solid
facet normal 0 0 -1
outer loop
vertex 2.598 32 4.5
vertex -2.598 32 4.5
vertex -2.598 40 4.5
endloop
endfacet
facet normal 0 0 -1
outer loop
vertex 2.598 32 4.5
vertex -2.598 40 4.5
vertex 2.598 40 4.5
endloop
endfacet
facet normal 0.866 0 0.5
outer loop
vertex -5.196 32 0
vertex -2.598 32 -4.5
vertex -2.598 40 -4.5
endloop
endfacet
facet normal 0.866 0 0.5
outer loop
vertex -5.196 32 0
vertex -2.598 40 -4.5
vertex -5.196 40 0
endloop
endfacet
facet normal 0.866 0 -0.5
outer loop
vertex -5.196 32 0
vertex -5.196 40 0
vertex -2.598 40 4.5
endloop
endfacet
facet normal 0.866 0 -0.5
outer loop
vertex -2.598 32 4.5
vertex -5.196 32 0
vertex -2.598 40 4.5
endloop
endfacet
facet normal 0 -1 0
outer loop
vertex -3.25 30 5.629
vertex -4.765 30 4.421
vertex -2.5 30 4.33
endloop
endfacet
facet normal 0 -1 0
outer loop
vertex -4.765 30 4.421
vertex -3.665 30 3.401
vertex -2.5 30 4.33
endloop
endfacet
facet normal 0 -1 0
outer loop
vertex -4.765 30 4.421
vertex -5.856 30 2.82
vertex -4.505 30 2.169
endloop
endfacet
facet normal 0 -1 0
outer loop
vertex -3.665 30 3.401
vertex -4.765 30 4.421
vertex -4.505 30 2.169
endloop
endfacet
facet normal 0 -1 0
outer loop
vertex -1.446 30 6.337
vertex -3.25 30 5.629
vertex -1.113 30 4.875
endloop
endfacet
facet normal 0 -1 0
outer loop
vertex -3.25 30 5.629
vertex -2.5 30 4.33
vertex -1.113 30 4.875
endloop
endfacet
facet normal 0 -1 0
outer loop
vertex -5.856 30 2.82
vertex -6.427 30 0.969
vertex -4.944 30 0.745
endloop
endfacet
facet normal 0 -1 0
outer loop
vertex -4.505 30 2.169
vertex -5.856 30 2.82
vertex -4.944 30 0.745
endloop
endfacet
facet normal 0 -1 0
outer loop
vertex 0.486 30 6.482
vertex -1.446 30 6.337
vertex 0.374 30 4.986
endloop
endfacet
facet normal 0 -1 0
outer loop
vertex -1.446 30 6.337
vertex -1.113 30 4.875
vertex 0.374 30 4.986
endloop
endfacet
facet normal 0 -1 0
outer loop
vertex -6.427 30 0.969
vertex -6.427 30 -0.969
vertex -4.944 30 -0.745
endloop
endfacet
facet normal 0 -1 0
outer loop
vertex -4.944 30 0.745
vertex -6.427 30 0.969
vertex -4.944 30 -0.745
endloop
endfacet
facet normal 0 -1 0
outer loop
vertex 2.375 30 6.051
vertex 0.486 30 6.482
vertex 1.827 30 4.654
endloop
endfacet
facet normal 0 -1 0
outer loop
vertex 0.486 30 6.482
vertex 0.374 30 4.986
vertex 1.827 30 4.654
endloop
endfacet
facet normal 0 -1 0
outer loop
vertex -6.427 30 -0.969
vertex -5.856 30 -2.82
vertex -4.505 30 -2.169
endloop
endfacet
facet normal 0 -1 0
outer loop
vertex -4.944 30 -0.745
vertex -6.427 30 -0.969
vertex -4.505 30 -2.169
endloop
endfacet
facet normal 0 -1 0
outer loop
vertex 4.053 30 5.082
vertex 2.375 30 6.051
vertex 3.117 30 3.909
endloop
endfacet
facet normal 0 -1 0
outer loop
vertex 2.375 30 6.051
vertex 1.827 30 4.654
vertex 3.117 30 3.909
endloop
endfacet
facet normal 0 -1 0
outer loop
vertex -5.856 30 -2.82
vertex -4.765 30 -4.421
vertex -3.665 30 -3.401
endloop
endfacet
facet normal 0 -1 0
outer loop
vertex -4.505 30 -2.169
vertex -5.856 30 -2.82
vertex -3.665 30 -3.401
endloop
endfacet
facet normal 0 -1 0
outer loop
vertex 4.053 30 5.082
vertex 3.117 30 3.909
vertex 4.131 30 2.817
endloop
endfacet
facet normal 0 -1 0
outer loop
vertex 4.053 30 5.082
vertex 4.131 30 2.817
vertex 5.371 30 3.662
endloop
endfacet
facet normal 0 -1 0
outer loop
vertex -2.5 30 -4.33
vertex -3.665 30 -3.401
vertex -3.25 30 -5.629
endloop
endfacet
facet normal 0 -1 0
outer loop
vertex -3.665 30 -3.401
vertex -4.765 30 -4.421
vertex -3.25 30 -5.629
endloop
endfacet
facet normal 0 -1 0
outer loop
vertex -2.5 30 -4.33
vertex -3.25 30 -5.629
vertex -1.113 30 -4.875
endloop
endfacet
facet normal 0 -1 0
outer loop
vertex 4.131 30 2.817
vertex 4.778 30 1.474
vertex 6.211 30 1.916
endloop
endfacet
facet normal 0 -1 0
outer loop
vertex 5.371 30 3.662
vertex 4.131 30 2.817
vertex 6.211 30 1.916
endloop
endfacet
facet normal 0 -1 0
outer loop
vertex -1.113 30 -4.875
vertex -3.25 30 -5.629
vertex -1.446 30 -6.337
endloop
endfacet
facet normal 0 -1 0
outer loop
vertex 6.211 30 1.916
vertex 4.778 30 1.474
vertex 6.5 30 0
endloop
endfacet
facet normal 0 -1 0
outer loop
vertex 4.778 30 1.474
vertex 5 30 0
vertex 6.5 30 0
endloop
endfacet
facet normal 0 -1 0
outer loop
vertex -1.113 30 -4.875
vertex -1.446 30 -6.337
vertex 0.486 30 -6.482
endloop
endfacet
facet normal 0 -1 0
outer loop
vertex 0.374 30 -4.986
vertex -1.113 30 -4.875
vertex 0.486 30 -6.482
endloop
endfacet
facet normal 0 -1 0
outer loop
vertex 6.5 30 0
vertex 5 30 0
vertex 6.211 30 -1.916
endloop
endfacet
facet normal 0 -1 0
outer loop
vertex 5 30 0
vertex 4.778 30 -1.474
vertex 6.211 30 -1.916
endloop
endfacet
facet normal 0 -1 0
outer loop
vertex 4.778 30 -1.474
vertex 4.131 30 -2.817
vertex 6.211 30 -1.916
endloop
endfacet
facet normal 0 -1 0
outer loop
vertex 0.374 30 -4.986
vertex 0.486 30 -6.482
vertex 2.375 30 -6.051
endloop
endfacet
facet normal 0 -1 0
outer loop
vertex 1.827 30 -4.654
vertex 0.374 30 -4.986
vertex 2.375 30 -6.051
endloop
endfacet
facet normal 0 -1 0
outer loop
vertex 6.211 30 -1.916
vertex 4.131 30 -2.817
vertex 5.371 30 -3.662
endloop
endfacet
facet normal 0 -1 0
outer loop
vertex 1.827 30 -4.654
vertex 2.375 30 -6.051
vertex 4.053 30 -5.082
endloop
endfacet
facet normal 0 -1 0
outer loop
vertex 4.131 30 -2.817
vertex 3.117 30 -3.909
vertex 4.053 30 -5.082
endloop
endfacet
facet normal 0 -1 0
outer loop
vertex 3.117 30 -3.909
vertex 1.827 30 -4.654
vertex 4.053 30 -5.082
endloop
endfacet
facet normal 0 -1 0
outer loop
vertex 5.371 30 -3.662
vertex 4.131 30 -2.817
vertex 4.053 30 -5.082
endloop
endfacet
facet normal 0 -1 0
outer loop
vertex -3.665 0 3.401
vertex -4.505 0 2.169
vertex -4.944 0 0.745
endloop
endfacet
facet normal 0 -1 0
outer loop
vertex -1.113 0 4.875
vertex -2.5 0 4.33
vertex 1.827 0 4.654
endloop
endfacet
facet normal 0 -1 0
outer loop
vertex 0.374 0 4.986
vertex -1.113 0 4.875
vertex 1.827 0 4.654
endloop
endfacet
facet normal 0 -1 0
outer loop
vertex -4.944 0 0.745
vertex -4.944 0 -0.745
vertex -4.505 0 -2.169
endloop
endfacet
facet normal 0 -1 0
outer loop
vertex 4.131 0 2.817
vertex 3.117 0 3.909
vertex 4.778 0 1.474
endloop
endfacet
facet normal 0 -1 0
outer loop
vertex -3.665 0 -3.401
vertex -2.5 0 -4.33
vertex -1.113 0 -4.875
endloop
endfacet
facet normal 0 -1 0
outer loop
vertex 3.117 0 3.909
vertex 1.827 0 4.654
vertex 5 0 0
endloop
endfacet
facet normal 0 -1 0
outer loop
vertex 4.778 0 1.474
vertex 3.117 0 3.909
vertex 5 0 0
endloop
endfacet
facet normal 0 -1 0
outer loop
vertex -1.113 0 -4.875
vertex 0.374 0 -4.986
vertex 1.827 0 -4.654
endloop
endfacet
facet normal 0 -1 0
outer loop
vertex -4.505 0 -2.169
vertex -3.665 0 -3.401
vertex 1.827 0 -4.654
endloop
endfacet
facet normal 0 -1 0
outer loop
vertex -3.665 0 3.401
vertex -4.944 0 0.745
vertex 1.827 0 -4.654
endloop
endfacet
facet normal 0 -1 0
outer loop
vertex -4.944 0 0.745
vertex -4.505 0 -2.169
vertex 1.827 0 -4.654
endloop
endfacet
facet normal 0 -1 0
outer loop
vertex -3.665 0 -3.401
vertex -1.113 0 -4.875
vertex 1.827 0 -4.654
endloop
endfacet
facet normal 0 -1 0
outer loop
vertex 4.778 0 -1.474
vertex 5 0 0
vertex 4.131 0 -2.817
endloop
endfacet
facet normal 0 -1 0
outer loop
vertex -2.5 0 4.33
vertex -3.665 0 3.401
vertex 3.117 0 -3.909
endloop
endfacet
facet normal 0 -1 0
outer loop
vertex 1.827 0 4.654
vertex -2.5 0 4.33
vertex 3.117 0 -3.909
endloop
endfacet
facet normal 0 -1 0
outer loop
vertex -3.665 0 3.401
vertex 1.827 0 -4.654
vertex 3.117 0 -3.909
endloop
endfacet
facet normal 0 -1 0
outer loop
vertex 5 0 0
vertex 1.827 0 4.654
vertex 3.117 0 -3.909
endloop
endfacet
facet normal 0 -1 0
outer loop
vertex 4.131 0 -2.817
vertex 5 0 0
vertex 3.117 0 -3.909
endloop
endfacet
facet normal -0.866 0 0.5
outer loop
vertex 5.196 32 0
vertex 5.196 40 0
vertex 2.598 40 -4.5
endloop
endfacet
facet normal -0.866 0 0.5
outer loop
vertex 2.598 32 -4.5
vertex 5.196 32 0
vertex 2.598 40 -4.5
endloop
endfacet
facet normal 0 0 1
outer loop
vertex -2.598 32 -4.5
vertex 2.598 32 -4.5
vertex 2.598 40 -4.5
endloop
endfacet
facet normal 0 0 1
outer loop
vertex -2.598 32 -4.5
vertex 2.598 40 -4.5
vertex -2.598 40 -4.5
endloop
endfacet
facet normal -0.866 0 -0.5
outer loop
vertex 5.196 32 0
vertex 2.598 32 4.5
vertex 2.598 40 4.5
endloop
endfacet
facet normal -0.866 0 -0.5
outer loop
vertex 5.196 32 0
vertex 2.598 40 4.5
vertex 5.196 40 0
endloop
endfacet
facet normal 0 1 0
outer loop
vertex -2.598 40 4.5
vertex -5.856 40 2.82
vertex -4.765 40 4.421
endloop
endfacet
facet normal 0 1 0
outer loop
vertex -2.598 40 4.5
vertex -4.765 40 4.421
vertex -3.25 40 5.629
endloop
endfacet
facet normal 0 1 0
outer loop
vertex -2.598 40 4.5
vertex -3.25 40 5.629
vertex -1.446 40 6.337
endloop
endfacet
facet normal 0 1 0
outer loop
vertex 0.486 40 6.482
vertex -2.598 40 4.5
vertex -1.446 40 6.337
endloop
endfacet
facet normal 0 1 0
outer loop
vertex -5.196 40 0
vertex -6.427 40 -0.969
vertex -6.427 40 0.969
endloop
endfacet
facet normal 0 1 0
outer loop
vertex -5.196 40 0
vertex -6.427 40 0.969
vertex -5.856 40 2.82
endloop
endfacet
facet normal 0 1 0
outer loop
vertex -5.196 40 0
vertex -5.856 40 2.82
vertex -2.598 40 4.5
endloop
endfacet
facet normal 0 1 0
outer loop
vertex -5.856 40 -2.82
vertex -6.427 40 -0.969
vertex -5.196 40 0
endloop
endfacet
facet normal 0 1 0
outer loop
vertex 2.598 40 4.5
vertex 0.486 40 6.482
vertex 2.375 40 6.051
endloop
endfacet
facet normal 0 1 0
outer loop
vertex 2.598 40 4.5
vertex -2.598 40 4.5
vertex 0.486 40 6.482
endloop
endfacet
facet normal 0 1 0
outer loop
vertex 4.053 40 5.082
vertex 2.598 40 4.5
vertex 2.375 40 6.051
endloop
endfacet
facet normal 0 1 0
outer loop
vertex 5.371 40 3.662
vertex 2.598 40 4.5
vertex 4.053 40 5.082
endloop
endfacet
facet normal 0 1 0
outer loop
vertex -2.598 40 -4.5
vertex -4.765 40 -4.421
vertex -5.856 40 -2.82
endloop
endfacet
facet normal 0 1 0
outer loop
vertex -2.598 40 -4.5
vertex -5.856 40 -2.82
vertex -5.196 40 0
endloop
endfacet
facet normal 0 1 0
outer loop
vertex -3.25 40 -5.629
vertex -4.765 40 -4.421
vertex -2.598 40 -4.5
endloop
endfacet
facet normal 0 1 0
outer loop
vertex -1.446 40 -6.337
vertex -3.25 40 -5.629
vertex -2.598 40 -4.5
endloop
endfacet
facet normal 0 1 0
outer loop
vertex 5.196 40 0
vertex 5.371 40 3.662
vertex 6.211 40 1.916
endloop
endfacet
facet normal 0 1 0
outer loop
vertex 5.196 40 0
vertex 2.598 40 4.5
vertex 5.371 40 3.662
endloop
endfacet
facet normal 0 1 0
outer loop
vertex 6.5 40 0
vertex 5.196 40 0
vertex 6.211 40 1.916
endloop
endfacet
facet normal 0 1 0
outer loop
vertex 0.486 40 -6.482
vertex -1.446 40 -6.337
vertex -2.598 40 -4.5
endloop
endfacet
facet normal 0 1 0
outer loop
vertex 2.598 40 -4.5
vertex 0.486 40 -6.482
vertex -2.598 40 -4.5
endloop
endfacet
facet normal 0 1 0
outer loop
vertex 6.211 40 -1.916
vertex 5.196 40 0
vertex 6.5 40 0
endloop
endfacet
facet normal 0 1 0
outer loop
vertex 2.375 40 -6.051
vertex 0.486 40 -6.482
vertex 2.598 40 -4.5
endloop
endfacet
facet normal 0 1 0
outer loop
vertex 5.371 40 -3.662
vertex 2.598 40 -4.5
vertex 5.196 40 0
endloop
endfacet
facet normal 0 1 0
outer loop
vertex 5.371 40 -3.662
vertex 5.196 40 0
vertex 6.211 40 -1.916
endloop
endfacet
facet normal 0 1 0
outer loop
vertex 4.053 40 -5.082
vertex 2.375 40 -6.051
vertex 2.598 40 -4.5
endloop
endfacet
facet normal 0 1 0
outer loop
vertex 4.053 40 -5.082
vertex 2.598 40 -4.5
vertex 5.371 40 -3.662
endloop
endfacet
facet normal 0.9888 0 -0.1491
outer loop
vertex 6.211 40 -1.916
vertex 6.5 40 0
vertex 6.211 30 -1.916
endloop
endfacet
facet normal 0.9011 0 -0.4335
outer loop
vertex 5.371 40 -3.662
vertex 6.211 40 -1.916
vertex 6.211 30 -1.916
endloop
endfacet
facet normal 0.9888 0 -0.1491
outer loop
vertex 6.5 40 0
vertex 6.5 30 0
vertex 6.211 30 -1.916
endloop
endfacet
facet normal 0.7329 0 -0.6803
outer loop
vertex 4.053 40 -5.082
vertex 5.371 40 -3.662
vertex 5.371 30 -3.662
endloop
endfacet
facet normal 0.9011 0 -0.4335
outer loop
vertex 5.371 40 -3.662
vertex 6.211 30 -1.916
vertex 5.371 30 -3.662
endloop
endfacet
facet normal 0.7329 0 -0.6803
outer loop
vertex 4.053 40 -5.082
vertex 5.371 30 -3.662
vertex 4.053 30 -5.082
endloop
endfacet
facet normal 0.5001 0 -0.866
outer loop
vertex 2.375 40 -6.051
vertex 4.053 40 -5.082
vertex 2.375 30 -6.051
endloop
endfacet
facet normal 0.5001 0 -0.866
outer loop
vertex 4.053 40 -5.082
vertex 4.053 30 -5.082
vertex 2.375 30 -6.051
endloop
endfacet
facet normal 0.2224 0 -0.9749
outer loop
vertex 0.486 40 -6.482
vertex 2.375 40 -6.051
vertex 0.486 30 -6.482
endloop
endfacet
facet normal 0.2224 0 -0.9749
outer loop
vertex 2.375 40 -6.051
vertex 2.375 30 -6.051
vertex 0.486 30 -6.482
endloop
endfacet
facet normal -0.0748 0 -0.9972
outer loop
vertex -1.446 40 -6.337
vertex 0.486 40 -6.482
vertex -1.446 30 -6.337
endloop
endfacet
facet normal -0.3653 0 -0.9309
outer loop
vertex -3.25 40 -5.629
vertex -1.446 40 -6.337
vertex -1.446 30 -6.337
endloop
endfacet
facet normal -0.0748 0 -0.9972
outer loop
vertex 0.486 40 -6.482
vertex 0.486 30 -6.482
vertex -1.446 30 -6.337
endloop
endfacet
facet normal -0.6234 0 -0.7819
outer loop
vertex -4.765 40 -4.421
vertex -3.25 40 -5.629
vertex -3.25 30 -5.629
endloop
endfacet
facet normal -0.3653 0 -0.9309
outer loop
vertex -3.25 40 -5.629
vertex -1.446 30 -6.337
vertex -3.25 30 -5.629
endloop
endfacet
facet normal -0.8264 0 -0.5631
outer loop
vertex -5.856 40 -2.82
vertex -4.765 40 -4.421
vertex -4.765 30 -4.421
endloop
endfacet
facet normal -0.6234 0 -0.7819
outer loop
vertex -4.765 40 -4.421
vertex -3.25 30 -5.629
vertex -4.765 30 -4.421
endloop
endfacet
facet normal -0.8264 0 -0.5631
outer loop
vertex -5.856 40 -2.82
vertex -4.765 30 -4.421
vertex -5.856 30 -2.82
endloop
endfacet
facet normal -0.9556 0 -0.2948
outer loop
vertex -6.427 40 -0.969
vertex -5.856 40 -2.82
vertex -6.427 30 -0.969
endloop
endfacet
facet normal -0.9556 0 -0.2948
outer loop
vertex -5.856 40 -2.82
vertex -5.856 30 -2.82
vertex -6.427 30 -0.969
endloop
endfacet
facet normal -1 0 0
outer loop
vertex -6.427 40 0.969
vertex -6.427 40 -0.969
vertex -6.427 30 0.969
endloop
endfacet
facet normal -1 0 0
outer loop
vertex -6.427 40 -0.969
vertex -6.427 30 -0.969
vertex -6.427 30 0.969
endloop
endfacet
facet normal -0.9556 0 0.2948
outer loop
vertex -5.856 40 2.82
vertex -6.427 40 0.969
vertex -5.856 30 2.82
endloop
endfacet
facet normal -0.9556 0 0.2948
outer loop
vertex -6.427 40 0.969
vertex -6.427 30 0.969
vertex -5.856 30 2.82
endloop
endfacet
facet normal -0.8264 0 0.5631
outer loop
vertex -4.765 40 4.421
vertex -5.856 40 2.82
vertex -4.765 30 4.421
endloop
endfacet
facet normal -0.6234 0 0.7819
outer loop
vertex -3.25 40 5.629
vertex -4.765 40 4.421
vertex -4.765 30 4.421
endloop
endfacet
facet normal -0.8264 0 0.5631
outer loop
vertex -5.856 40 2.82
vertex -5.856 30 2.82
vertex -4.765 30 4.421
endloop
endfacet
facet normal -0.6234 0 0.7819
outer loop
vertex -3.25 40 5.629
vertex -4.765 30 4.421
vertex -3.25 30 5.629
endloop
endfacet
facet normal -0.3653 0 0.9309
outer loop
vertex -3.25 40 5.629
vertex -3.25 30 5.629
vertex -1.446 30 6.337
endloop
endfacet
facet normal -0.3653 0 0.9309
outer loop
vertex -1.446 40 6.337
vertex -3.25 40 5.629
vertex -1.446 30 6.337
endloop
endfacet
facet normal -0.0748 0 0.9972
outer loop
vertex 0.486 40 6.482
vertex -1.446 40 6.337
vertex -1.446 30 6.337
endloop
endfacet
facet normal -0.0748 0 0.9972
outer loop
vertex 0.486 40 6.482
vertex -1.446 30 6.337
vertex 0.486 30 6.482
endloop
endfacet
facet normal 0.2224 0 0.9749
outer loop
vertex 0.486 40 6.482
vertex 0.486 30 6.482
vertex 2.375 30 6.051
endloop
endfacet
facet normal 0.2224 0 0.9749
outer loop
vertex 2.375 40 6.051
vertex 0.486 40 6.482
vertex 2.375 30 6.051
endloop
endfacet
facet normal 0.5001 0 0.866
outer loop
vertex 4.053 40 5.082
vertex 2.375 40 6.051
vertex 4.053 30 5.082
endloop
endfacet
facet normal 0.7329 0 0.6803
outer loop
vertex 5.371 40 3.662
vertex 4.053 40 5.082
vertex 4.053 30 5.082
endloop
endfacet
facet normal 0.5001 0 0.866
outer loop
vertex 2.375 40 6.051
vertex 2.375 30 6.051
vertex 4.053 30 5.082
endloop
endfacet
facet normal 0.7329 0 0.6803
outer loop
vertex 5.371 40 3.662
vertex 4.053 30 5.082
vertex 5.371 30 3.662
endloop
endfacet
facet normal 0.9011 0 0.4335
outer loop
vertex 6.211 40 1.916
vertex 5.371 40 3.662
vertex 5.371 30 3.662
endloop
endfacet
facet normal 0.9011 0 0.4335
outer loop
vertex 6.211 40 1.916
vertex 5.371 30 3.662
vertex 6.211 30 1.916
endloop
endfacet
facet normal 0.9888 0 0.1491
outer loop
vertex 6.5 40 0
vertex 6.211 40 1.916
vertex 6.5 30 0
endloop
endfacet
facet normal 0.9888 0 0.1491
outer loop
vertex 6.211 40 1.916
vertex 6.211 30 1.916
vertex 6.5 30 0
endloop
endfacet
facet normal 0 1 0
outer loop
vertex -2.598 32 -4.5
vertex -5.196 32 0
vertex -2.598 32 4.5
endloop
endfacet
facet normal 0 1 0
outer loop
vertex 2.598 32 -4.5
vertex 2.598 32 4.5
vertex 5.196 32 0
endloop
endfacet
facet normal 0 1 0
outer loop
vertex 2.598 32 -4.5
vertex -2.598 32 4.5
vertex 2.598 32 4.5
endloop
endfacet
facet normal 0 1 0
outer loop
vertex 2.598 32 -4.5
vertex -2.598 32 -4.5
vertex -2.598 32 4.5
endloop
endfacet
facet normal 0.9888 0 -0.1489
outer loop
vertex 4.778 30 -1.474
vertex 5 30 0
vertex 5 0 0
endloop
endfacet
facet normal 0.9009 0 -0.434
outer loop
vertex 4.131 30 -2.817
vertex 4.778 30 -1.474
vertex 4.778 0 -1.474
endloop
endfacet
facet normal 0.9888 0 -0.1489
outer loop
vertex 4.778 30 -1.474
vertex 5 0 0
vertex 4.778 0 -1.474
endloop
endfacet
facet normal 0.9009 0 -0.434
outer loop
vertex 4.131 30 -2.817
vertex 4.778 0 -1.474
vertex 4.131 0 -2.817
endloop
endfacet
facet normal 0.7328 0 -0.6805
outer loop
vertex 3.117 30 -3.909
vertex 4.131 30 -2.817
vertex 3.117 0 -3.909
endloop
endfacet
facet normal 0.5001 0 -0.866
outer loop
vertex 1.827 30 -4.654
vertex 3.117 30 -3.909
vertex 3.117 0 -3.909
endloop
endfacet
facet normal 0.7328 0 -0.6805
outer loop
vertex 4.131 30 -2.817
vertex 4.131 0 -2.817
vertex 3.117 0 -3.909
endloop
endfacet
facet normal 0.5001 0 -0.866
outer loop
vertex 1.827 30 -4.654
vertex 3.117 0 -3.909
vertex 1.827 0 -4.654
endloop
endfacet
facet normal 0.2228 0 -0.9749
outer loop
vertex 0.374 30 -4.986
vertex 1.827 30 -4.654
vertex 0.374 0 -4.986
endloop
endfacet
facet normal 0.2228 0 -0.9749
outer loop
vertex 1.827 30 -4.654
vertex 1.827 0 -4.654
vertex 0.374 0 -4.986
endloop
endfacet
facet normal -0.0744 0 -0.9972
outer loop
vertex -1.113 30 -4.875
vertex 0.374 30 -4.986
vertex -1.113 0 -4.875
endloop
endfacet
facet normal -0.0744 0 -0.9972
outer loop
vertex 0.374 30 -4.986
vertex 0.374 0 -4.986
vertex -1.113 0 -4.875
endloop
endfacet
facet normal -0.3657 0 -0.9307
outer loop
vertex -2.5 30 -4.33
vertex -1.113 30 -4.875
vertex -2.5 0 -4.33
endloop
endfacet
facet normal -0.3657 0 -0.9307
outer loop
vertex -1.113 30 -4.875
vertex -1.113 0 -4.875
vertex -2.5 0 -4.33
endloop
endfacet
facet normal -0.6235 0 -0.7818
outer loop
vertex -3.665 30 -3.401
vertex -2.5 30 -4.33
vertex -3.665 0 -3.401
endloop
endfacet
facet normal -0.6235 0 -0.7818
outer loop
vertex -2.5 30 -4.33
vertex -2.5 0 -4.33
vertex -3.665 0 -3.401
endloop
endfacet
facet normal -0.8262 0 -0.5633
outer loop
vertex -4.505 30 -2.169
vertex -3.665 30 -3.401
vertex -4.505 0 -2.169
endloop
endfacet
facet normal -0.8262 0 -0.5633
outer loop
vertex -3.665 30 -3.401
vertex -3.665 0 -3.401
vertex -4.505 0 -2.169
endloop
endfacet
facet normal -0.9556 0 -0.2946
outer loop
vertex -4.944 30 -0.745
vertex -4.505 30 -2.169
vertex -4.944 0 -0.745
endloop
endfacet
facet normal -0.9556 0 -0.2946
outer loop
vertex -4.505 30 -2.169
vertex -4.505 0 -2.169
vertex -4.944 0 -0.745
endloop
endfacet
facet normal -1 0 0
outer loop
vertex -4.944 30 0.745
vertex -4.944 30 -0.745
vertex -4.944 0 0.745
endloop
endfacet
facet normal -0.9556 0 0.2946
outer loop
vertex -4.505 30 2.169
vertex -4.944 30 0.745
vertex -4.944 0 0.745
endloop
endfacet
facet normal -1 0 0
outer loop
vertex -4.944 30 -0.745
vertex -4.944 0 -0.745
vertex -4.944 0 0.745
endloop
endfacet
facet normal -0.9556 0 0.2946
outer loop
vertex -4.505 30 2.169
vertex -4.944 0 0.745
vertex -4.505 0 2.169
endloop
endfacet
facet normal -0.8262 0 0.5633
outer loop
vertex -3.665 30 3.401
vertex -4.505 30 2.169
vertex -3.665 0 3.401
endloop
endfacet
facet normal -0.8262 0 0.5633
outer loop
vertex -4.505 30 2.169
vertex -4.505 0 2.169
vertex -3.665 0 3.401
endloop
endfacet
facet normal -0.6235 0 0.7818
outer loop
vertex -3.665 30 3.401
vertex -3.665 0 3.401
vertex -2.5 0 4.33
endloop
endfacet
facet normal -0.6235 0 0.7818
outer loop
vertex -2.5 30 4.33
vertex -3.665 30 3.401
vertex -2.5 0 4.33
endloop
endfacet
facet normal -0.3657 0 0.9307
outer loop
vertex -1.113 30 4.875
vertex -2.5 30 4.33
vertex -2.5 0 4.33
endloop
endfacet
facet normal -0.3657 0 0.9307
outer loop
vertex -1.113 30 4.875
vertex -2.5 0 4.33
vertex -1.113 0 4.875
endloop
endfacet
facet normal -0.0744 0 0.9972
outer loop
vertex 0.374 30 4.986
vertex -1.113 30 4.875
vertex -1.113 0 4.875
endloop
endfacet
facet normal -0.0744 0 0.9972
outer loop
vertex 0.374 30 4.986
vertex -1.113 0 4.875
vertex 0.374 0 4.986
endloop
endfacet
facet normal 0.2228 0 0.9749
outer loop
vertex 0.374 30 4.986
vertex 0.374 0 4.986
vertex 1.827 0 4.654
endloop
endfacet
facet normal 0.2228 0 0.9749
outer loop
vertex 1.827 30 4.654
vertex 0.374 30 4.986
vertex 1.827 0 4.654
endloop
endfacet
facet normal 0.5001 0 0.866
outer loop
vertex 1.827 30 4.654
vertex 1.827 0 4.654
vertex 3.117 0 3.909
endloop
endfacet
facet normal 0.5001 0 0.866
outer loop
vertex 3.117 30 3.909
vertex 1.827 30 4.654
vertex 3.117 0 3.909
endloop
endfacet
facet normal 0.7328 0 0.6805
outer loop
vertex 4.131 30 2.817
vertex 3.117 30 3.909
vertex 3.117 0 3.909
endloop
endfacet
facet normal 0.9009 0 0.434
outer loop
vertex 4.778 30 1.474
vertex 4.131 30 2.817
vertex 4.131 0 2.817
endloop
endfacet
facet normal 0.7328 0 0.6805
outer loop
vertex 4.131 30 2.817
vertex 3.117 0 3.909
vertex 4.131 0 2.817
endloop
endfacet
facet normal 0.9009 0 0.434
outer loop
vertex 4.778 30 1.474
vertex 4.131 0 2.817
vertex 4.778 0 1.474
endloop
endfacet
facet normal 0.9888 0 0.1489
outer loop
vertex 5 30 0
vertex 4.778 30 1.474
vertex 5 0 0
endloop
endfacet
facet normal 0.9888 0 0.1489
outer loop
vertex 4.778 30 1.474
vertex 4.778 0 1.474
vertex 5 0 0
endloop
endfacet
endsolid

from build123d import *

# Parameters (mm, degrees)
SKETCH1_R           = 5
BOSS_EXTRUDE1_DEPTH = 30
SKETCH2_R           = 6.5
BOSS_EXTRUDE2_DEPTH = 2
SKETCH3_R           = 6.5
BOSS_EXTRUDE3_DEPTH = 8


with BuildPart() as part:
    # Sketch1 → Boss-Extrude1 (new body)
    with BuildSketch(Plane(origin=(0, 0, 0), x_dir=(1, 0, 0), z_dir=(0, 1, 0))):
        Circle(SKETCH1_R)
    extrude(amount=BOSS_EXTRUDE1_DEPTH)

    # Sketch2 → Boss-Extrude2 (add)
    with BuildSketch(Plane(origin=(0, 30, 0), x_dir=(1, 0, 0), z_dir=(0, 1, 0))):
        Circle(SKETCH2_R)
    extrude(amount=BOSS_EXTRUDE2_DEPTH)

    # Sketch3 → Boss-Extrude3 (add)
    with BuildSketch(Plane(origin=(0, 32, 0), x_dir=(1, 0, 0), z_dir=(0, 1, 0))):
        Circle(SKETCH3_R)
        Polygon((5.196152423, 0), (2.598076211, 4.5), (-2.598076211, 4.5), (-5.196152423, 0), (-2.598076211, -4.5), (2.598076211, -4.5), align=None, mode=Mode.SUBTRACT)
    extrude(amount=BOSS_EXTRUDE3_DEPTH)


solid = part.part
